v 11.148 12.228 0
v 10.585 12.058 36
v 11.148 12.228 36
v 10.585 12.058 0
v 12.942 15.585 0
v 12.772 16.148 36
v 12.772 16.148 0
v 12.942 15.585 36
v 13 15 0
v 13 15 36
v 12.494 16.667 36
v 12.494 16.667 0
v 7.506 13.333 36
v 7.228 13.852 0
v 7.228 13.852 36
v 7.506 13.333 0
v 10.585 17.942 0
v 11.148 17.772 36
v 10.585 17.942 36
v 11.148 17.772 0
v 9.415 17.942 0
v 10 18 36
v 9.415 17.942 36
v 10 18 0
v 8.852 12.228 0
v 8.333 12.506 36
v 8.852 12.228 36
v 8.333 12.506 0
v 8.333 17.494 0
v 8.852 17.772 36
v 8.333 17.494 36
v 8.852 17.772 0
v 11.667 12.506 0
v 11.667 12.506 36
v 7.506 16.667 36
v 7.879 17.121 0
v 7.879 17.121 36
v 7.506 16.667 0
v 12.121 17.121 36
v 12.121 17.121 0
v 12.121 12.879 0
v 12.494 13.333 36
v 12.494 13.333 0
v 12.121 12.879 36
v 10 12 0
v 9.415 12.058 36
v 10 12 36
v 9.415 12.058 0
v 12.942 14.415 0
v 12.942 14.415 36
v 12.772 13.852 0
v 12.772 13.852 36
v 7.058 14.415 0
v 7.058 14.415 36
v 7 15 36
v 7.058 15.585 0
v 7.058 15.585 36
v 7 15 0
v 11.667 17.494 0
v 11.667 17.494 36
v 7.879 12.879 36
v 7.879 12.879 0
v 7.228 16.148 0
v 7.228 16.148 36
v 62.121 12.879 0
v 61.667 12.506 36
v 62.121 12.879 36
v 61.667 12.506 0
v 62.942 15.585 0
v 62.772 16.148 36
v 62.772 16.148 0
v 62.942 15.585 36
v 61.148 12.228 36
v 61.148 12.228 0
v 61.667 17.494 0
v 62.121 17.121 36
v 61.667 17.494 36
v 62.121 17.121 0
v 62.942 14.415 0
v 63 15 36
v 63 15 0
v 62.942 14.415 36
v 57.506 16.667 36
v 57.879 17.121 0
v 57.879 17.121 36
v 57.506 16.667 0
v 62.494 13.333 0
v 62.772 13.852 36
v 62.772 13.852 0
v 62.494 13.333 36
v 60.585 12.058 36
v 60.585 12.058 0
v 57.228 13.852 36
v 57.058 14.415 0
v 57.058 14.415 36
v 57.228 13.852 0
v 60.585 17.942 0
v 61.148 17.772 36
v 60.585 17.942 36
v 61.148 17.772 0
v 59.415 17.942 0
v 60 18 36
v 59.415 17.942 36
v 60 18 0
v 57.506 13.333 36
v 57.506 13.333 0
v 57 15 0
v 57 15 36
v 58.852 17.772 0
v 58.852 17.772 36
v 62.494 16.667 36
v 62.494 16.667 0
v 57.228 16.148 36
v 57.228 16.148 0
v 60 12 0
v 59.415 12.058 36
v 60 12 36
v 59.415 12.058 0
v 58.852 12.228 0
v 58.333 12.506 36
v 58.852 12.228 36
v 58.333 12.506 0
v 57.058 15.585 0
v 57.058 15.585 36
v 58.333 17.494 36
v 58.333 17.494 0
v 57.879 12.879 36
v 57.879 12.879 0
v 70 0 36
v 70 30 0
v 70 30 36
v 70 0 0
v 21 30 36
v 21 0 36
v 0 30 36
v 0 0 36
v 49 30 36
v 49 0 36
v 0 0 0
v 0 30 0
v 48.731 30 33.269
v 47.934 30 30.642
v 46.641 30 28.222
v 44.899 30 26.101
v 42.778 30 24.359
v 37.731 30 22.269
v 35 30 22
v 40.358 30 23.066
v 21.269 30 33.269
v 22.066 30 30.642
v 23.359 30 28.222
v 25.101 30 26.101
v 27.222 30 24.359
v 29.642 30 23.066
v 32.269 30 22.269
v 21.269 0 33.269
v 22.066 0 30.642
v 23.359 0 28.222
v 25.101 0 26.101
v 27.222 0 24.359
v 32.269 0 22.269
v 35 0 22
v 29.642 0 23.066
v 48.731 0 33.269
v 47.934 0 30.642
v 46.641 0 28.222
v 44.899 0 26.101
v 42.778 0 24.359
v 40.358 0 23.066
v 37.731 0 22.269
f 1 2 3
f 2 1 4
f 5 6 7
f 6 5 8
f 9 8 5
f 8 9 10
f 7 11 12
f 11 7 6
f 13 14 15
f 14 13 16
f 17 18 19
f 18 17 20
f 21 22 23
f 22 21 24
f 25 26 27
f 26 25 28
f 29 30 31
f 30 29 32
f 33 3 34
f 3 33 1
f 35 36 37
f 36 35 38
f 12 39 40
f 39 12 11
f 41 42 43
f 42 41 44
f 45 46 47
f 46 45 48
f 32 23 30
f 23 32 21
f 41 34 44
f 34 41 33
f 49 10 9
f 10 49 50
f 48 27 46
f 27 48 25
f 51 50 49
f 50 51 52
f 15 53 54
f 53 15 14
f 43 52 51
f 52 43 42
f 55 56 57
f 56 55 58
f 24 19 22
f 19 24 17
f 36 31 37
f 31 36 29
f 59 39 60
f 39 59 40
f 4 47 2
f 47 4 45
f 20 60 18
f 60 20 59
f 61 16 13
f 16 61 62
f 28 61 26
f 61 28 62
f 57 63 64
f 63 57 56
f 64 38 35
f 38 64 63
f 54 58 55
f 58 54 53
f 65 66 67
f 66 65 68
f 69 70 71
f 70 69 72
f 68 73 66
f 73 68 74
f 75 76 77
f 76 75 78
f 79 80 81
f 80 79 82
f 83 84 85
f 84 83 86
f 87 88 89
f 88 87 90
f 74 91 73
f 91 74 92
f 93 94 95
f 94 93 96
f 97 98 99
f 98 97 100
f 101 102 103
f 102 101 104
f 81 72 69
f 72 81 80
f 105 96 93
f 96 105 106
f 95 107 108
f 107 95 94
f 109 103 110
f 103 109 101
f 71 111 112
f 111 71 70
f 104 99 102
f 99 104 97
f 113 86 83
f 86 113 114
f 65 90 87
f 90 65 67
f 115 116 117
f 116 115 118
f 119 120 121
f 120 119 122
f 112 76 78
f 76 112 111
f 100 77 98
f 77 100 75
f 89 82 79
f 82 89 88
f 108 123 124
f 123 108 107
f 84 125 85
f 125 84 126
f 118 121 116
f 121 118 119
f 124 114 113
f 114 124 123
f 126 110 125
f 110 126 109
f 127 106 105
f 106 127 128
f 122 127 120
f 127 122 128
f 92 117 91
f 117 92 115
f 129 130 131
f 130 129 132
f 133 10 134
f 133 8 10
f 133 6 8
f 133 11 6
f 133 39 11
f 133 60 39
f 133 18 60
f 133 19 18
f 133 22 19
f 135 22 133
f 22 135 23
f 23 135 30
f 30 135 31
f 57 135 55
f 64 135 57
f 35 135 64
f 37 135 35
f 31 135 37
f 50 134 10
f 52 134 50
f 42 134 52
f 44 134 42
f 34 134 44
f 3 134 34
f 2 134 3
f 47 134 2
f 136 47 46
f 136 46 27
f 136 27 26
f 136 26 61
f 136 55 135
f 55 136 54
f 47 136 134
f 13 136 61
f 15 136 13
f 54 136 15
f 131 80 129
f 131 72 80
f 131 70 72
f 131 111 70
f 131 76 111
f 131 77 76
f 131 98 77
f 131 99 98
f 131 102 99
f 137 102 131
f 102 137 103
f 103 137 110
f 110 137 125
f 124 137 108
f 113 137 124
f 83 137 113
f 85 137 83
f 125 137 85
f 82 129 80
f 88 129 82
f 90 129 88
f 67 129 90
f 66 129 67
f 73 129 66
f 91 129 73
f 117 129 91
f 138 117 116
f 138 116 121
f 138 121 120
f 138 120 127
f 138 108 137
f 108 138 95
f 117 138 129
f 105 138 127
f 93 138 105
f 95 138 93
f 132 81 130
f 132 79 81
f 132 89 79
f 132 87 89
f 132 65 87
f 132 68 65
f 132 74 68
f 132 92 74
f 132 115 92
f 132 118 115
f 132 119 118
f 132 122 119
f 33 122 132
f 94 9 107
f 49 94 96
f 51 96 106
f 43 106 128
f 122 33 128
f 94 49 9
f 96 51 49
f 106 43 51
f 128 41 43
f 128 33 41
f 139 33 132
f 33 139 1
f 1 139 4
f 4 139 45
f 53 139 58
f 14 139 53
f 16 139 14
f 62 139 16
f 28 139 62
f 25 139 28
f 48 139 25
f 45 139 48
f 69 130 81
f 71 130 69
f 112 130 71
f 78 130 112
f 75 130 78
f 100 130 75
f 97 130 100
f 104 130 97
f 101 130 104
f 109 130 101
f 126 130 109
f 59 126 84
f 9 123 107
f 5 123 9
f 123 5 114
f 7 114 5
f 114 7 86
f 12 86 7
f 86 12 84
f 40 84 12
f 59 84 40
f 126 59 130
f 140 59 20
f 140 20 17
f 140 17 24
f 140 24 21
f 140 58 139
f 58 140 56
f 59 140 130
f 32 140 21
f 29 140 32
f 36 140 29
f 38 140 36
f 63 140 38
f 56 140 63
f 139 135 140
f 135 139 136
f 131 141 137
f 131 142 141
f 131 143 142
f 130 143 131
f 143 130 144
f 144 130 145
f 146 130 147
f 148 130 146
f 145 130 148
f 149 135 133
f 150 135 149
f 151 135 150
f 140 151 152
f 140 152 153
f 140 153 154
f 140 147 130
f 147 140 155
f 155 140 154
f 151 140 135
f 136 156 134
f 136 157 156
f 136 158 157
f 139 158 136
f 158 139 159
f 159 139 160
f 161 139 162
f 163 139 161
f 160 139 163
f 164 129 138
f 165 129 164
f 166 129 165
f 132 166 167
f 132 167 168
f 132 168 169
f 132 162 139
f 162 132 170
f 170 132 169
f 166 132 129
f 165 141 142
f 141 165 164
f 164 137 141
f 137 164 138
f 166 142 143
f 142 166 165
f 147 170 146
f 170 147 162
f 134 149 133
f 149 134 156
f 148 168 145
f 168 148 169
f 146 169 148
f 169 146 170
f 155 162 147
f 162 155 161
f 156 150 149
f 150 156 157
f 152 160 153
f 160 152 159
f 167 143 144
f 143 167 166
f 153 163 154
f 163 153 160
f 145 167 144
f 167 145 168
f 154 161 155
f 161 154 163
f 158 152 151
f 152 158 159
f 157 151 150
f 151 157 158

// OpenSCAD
$fn = 32;

// ----------------------------------------------------------------------
// Saddle clamp: plain shaft clamp
// ----------------------------------------------------------------------

// --- parameters (mm) ---
blk_l = 70;               // block length, X
blk_w = 30;               // block width, Y
blk_h = 36;               // block height
clamp_r = 14;             // shaft groove radius
hole_r = 3;               // bolt hole radius
hole_m = 10;              // bolt hole margin from the ends

saw_depth = clamp_r + 3;  // saw kerf depth

difference() {
  cube([blk_l, blk_w, blk_h]);
  translate([blk_l / 2, -1, blk_h])
    rotate([-90, 0, 0])
      cylinder(h = blk_w + 2, r = clamp_r);
  for (sx = [0, 1])
    translate([sx ? blk_l - hole_m : hole_m, blk_w / 2, -1])
      cylinder(r = hole_r, h = blk_h + 2);
}
